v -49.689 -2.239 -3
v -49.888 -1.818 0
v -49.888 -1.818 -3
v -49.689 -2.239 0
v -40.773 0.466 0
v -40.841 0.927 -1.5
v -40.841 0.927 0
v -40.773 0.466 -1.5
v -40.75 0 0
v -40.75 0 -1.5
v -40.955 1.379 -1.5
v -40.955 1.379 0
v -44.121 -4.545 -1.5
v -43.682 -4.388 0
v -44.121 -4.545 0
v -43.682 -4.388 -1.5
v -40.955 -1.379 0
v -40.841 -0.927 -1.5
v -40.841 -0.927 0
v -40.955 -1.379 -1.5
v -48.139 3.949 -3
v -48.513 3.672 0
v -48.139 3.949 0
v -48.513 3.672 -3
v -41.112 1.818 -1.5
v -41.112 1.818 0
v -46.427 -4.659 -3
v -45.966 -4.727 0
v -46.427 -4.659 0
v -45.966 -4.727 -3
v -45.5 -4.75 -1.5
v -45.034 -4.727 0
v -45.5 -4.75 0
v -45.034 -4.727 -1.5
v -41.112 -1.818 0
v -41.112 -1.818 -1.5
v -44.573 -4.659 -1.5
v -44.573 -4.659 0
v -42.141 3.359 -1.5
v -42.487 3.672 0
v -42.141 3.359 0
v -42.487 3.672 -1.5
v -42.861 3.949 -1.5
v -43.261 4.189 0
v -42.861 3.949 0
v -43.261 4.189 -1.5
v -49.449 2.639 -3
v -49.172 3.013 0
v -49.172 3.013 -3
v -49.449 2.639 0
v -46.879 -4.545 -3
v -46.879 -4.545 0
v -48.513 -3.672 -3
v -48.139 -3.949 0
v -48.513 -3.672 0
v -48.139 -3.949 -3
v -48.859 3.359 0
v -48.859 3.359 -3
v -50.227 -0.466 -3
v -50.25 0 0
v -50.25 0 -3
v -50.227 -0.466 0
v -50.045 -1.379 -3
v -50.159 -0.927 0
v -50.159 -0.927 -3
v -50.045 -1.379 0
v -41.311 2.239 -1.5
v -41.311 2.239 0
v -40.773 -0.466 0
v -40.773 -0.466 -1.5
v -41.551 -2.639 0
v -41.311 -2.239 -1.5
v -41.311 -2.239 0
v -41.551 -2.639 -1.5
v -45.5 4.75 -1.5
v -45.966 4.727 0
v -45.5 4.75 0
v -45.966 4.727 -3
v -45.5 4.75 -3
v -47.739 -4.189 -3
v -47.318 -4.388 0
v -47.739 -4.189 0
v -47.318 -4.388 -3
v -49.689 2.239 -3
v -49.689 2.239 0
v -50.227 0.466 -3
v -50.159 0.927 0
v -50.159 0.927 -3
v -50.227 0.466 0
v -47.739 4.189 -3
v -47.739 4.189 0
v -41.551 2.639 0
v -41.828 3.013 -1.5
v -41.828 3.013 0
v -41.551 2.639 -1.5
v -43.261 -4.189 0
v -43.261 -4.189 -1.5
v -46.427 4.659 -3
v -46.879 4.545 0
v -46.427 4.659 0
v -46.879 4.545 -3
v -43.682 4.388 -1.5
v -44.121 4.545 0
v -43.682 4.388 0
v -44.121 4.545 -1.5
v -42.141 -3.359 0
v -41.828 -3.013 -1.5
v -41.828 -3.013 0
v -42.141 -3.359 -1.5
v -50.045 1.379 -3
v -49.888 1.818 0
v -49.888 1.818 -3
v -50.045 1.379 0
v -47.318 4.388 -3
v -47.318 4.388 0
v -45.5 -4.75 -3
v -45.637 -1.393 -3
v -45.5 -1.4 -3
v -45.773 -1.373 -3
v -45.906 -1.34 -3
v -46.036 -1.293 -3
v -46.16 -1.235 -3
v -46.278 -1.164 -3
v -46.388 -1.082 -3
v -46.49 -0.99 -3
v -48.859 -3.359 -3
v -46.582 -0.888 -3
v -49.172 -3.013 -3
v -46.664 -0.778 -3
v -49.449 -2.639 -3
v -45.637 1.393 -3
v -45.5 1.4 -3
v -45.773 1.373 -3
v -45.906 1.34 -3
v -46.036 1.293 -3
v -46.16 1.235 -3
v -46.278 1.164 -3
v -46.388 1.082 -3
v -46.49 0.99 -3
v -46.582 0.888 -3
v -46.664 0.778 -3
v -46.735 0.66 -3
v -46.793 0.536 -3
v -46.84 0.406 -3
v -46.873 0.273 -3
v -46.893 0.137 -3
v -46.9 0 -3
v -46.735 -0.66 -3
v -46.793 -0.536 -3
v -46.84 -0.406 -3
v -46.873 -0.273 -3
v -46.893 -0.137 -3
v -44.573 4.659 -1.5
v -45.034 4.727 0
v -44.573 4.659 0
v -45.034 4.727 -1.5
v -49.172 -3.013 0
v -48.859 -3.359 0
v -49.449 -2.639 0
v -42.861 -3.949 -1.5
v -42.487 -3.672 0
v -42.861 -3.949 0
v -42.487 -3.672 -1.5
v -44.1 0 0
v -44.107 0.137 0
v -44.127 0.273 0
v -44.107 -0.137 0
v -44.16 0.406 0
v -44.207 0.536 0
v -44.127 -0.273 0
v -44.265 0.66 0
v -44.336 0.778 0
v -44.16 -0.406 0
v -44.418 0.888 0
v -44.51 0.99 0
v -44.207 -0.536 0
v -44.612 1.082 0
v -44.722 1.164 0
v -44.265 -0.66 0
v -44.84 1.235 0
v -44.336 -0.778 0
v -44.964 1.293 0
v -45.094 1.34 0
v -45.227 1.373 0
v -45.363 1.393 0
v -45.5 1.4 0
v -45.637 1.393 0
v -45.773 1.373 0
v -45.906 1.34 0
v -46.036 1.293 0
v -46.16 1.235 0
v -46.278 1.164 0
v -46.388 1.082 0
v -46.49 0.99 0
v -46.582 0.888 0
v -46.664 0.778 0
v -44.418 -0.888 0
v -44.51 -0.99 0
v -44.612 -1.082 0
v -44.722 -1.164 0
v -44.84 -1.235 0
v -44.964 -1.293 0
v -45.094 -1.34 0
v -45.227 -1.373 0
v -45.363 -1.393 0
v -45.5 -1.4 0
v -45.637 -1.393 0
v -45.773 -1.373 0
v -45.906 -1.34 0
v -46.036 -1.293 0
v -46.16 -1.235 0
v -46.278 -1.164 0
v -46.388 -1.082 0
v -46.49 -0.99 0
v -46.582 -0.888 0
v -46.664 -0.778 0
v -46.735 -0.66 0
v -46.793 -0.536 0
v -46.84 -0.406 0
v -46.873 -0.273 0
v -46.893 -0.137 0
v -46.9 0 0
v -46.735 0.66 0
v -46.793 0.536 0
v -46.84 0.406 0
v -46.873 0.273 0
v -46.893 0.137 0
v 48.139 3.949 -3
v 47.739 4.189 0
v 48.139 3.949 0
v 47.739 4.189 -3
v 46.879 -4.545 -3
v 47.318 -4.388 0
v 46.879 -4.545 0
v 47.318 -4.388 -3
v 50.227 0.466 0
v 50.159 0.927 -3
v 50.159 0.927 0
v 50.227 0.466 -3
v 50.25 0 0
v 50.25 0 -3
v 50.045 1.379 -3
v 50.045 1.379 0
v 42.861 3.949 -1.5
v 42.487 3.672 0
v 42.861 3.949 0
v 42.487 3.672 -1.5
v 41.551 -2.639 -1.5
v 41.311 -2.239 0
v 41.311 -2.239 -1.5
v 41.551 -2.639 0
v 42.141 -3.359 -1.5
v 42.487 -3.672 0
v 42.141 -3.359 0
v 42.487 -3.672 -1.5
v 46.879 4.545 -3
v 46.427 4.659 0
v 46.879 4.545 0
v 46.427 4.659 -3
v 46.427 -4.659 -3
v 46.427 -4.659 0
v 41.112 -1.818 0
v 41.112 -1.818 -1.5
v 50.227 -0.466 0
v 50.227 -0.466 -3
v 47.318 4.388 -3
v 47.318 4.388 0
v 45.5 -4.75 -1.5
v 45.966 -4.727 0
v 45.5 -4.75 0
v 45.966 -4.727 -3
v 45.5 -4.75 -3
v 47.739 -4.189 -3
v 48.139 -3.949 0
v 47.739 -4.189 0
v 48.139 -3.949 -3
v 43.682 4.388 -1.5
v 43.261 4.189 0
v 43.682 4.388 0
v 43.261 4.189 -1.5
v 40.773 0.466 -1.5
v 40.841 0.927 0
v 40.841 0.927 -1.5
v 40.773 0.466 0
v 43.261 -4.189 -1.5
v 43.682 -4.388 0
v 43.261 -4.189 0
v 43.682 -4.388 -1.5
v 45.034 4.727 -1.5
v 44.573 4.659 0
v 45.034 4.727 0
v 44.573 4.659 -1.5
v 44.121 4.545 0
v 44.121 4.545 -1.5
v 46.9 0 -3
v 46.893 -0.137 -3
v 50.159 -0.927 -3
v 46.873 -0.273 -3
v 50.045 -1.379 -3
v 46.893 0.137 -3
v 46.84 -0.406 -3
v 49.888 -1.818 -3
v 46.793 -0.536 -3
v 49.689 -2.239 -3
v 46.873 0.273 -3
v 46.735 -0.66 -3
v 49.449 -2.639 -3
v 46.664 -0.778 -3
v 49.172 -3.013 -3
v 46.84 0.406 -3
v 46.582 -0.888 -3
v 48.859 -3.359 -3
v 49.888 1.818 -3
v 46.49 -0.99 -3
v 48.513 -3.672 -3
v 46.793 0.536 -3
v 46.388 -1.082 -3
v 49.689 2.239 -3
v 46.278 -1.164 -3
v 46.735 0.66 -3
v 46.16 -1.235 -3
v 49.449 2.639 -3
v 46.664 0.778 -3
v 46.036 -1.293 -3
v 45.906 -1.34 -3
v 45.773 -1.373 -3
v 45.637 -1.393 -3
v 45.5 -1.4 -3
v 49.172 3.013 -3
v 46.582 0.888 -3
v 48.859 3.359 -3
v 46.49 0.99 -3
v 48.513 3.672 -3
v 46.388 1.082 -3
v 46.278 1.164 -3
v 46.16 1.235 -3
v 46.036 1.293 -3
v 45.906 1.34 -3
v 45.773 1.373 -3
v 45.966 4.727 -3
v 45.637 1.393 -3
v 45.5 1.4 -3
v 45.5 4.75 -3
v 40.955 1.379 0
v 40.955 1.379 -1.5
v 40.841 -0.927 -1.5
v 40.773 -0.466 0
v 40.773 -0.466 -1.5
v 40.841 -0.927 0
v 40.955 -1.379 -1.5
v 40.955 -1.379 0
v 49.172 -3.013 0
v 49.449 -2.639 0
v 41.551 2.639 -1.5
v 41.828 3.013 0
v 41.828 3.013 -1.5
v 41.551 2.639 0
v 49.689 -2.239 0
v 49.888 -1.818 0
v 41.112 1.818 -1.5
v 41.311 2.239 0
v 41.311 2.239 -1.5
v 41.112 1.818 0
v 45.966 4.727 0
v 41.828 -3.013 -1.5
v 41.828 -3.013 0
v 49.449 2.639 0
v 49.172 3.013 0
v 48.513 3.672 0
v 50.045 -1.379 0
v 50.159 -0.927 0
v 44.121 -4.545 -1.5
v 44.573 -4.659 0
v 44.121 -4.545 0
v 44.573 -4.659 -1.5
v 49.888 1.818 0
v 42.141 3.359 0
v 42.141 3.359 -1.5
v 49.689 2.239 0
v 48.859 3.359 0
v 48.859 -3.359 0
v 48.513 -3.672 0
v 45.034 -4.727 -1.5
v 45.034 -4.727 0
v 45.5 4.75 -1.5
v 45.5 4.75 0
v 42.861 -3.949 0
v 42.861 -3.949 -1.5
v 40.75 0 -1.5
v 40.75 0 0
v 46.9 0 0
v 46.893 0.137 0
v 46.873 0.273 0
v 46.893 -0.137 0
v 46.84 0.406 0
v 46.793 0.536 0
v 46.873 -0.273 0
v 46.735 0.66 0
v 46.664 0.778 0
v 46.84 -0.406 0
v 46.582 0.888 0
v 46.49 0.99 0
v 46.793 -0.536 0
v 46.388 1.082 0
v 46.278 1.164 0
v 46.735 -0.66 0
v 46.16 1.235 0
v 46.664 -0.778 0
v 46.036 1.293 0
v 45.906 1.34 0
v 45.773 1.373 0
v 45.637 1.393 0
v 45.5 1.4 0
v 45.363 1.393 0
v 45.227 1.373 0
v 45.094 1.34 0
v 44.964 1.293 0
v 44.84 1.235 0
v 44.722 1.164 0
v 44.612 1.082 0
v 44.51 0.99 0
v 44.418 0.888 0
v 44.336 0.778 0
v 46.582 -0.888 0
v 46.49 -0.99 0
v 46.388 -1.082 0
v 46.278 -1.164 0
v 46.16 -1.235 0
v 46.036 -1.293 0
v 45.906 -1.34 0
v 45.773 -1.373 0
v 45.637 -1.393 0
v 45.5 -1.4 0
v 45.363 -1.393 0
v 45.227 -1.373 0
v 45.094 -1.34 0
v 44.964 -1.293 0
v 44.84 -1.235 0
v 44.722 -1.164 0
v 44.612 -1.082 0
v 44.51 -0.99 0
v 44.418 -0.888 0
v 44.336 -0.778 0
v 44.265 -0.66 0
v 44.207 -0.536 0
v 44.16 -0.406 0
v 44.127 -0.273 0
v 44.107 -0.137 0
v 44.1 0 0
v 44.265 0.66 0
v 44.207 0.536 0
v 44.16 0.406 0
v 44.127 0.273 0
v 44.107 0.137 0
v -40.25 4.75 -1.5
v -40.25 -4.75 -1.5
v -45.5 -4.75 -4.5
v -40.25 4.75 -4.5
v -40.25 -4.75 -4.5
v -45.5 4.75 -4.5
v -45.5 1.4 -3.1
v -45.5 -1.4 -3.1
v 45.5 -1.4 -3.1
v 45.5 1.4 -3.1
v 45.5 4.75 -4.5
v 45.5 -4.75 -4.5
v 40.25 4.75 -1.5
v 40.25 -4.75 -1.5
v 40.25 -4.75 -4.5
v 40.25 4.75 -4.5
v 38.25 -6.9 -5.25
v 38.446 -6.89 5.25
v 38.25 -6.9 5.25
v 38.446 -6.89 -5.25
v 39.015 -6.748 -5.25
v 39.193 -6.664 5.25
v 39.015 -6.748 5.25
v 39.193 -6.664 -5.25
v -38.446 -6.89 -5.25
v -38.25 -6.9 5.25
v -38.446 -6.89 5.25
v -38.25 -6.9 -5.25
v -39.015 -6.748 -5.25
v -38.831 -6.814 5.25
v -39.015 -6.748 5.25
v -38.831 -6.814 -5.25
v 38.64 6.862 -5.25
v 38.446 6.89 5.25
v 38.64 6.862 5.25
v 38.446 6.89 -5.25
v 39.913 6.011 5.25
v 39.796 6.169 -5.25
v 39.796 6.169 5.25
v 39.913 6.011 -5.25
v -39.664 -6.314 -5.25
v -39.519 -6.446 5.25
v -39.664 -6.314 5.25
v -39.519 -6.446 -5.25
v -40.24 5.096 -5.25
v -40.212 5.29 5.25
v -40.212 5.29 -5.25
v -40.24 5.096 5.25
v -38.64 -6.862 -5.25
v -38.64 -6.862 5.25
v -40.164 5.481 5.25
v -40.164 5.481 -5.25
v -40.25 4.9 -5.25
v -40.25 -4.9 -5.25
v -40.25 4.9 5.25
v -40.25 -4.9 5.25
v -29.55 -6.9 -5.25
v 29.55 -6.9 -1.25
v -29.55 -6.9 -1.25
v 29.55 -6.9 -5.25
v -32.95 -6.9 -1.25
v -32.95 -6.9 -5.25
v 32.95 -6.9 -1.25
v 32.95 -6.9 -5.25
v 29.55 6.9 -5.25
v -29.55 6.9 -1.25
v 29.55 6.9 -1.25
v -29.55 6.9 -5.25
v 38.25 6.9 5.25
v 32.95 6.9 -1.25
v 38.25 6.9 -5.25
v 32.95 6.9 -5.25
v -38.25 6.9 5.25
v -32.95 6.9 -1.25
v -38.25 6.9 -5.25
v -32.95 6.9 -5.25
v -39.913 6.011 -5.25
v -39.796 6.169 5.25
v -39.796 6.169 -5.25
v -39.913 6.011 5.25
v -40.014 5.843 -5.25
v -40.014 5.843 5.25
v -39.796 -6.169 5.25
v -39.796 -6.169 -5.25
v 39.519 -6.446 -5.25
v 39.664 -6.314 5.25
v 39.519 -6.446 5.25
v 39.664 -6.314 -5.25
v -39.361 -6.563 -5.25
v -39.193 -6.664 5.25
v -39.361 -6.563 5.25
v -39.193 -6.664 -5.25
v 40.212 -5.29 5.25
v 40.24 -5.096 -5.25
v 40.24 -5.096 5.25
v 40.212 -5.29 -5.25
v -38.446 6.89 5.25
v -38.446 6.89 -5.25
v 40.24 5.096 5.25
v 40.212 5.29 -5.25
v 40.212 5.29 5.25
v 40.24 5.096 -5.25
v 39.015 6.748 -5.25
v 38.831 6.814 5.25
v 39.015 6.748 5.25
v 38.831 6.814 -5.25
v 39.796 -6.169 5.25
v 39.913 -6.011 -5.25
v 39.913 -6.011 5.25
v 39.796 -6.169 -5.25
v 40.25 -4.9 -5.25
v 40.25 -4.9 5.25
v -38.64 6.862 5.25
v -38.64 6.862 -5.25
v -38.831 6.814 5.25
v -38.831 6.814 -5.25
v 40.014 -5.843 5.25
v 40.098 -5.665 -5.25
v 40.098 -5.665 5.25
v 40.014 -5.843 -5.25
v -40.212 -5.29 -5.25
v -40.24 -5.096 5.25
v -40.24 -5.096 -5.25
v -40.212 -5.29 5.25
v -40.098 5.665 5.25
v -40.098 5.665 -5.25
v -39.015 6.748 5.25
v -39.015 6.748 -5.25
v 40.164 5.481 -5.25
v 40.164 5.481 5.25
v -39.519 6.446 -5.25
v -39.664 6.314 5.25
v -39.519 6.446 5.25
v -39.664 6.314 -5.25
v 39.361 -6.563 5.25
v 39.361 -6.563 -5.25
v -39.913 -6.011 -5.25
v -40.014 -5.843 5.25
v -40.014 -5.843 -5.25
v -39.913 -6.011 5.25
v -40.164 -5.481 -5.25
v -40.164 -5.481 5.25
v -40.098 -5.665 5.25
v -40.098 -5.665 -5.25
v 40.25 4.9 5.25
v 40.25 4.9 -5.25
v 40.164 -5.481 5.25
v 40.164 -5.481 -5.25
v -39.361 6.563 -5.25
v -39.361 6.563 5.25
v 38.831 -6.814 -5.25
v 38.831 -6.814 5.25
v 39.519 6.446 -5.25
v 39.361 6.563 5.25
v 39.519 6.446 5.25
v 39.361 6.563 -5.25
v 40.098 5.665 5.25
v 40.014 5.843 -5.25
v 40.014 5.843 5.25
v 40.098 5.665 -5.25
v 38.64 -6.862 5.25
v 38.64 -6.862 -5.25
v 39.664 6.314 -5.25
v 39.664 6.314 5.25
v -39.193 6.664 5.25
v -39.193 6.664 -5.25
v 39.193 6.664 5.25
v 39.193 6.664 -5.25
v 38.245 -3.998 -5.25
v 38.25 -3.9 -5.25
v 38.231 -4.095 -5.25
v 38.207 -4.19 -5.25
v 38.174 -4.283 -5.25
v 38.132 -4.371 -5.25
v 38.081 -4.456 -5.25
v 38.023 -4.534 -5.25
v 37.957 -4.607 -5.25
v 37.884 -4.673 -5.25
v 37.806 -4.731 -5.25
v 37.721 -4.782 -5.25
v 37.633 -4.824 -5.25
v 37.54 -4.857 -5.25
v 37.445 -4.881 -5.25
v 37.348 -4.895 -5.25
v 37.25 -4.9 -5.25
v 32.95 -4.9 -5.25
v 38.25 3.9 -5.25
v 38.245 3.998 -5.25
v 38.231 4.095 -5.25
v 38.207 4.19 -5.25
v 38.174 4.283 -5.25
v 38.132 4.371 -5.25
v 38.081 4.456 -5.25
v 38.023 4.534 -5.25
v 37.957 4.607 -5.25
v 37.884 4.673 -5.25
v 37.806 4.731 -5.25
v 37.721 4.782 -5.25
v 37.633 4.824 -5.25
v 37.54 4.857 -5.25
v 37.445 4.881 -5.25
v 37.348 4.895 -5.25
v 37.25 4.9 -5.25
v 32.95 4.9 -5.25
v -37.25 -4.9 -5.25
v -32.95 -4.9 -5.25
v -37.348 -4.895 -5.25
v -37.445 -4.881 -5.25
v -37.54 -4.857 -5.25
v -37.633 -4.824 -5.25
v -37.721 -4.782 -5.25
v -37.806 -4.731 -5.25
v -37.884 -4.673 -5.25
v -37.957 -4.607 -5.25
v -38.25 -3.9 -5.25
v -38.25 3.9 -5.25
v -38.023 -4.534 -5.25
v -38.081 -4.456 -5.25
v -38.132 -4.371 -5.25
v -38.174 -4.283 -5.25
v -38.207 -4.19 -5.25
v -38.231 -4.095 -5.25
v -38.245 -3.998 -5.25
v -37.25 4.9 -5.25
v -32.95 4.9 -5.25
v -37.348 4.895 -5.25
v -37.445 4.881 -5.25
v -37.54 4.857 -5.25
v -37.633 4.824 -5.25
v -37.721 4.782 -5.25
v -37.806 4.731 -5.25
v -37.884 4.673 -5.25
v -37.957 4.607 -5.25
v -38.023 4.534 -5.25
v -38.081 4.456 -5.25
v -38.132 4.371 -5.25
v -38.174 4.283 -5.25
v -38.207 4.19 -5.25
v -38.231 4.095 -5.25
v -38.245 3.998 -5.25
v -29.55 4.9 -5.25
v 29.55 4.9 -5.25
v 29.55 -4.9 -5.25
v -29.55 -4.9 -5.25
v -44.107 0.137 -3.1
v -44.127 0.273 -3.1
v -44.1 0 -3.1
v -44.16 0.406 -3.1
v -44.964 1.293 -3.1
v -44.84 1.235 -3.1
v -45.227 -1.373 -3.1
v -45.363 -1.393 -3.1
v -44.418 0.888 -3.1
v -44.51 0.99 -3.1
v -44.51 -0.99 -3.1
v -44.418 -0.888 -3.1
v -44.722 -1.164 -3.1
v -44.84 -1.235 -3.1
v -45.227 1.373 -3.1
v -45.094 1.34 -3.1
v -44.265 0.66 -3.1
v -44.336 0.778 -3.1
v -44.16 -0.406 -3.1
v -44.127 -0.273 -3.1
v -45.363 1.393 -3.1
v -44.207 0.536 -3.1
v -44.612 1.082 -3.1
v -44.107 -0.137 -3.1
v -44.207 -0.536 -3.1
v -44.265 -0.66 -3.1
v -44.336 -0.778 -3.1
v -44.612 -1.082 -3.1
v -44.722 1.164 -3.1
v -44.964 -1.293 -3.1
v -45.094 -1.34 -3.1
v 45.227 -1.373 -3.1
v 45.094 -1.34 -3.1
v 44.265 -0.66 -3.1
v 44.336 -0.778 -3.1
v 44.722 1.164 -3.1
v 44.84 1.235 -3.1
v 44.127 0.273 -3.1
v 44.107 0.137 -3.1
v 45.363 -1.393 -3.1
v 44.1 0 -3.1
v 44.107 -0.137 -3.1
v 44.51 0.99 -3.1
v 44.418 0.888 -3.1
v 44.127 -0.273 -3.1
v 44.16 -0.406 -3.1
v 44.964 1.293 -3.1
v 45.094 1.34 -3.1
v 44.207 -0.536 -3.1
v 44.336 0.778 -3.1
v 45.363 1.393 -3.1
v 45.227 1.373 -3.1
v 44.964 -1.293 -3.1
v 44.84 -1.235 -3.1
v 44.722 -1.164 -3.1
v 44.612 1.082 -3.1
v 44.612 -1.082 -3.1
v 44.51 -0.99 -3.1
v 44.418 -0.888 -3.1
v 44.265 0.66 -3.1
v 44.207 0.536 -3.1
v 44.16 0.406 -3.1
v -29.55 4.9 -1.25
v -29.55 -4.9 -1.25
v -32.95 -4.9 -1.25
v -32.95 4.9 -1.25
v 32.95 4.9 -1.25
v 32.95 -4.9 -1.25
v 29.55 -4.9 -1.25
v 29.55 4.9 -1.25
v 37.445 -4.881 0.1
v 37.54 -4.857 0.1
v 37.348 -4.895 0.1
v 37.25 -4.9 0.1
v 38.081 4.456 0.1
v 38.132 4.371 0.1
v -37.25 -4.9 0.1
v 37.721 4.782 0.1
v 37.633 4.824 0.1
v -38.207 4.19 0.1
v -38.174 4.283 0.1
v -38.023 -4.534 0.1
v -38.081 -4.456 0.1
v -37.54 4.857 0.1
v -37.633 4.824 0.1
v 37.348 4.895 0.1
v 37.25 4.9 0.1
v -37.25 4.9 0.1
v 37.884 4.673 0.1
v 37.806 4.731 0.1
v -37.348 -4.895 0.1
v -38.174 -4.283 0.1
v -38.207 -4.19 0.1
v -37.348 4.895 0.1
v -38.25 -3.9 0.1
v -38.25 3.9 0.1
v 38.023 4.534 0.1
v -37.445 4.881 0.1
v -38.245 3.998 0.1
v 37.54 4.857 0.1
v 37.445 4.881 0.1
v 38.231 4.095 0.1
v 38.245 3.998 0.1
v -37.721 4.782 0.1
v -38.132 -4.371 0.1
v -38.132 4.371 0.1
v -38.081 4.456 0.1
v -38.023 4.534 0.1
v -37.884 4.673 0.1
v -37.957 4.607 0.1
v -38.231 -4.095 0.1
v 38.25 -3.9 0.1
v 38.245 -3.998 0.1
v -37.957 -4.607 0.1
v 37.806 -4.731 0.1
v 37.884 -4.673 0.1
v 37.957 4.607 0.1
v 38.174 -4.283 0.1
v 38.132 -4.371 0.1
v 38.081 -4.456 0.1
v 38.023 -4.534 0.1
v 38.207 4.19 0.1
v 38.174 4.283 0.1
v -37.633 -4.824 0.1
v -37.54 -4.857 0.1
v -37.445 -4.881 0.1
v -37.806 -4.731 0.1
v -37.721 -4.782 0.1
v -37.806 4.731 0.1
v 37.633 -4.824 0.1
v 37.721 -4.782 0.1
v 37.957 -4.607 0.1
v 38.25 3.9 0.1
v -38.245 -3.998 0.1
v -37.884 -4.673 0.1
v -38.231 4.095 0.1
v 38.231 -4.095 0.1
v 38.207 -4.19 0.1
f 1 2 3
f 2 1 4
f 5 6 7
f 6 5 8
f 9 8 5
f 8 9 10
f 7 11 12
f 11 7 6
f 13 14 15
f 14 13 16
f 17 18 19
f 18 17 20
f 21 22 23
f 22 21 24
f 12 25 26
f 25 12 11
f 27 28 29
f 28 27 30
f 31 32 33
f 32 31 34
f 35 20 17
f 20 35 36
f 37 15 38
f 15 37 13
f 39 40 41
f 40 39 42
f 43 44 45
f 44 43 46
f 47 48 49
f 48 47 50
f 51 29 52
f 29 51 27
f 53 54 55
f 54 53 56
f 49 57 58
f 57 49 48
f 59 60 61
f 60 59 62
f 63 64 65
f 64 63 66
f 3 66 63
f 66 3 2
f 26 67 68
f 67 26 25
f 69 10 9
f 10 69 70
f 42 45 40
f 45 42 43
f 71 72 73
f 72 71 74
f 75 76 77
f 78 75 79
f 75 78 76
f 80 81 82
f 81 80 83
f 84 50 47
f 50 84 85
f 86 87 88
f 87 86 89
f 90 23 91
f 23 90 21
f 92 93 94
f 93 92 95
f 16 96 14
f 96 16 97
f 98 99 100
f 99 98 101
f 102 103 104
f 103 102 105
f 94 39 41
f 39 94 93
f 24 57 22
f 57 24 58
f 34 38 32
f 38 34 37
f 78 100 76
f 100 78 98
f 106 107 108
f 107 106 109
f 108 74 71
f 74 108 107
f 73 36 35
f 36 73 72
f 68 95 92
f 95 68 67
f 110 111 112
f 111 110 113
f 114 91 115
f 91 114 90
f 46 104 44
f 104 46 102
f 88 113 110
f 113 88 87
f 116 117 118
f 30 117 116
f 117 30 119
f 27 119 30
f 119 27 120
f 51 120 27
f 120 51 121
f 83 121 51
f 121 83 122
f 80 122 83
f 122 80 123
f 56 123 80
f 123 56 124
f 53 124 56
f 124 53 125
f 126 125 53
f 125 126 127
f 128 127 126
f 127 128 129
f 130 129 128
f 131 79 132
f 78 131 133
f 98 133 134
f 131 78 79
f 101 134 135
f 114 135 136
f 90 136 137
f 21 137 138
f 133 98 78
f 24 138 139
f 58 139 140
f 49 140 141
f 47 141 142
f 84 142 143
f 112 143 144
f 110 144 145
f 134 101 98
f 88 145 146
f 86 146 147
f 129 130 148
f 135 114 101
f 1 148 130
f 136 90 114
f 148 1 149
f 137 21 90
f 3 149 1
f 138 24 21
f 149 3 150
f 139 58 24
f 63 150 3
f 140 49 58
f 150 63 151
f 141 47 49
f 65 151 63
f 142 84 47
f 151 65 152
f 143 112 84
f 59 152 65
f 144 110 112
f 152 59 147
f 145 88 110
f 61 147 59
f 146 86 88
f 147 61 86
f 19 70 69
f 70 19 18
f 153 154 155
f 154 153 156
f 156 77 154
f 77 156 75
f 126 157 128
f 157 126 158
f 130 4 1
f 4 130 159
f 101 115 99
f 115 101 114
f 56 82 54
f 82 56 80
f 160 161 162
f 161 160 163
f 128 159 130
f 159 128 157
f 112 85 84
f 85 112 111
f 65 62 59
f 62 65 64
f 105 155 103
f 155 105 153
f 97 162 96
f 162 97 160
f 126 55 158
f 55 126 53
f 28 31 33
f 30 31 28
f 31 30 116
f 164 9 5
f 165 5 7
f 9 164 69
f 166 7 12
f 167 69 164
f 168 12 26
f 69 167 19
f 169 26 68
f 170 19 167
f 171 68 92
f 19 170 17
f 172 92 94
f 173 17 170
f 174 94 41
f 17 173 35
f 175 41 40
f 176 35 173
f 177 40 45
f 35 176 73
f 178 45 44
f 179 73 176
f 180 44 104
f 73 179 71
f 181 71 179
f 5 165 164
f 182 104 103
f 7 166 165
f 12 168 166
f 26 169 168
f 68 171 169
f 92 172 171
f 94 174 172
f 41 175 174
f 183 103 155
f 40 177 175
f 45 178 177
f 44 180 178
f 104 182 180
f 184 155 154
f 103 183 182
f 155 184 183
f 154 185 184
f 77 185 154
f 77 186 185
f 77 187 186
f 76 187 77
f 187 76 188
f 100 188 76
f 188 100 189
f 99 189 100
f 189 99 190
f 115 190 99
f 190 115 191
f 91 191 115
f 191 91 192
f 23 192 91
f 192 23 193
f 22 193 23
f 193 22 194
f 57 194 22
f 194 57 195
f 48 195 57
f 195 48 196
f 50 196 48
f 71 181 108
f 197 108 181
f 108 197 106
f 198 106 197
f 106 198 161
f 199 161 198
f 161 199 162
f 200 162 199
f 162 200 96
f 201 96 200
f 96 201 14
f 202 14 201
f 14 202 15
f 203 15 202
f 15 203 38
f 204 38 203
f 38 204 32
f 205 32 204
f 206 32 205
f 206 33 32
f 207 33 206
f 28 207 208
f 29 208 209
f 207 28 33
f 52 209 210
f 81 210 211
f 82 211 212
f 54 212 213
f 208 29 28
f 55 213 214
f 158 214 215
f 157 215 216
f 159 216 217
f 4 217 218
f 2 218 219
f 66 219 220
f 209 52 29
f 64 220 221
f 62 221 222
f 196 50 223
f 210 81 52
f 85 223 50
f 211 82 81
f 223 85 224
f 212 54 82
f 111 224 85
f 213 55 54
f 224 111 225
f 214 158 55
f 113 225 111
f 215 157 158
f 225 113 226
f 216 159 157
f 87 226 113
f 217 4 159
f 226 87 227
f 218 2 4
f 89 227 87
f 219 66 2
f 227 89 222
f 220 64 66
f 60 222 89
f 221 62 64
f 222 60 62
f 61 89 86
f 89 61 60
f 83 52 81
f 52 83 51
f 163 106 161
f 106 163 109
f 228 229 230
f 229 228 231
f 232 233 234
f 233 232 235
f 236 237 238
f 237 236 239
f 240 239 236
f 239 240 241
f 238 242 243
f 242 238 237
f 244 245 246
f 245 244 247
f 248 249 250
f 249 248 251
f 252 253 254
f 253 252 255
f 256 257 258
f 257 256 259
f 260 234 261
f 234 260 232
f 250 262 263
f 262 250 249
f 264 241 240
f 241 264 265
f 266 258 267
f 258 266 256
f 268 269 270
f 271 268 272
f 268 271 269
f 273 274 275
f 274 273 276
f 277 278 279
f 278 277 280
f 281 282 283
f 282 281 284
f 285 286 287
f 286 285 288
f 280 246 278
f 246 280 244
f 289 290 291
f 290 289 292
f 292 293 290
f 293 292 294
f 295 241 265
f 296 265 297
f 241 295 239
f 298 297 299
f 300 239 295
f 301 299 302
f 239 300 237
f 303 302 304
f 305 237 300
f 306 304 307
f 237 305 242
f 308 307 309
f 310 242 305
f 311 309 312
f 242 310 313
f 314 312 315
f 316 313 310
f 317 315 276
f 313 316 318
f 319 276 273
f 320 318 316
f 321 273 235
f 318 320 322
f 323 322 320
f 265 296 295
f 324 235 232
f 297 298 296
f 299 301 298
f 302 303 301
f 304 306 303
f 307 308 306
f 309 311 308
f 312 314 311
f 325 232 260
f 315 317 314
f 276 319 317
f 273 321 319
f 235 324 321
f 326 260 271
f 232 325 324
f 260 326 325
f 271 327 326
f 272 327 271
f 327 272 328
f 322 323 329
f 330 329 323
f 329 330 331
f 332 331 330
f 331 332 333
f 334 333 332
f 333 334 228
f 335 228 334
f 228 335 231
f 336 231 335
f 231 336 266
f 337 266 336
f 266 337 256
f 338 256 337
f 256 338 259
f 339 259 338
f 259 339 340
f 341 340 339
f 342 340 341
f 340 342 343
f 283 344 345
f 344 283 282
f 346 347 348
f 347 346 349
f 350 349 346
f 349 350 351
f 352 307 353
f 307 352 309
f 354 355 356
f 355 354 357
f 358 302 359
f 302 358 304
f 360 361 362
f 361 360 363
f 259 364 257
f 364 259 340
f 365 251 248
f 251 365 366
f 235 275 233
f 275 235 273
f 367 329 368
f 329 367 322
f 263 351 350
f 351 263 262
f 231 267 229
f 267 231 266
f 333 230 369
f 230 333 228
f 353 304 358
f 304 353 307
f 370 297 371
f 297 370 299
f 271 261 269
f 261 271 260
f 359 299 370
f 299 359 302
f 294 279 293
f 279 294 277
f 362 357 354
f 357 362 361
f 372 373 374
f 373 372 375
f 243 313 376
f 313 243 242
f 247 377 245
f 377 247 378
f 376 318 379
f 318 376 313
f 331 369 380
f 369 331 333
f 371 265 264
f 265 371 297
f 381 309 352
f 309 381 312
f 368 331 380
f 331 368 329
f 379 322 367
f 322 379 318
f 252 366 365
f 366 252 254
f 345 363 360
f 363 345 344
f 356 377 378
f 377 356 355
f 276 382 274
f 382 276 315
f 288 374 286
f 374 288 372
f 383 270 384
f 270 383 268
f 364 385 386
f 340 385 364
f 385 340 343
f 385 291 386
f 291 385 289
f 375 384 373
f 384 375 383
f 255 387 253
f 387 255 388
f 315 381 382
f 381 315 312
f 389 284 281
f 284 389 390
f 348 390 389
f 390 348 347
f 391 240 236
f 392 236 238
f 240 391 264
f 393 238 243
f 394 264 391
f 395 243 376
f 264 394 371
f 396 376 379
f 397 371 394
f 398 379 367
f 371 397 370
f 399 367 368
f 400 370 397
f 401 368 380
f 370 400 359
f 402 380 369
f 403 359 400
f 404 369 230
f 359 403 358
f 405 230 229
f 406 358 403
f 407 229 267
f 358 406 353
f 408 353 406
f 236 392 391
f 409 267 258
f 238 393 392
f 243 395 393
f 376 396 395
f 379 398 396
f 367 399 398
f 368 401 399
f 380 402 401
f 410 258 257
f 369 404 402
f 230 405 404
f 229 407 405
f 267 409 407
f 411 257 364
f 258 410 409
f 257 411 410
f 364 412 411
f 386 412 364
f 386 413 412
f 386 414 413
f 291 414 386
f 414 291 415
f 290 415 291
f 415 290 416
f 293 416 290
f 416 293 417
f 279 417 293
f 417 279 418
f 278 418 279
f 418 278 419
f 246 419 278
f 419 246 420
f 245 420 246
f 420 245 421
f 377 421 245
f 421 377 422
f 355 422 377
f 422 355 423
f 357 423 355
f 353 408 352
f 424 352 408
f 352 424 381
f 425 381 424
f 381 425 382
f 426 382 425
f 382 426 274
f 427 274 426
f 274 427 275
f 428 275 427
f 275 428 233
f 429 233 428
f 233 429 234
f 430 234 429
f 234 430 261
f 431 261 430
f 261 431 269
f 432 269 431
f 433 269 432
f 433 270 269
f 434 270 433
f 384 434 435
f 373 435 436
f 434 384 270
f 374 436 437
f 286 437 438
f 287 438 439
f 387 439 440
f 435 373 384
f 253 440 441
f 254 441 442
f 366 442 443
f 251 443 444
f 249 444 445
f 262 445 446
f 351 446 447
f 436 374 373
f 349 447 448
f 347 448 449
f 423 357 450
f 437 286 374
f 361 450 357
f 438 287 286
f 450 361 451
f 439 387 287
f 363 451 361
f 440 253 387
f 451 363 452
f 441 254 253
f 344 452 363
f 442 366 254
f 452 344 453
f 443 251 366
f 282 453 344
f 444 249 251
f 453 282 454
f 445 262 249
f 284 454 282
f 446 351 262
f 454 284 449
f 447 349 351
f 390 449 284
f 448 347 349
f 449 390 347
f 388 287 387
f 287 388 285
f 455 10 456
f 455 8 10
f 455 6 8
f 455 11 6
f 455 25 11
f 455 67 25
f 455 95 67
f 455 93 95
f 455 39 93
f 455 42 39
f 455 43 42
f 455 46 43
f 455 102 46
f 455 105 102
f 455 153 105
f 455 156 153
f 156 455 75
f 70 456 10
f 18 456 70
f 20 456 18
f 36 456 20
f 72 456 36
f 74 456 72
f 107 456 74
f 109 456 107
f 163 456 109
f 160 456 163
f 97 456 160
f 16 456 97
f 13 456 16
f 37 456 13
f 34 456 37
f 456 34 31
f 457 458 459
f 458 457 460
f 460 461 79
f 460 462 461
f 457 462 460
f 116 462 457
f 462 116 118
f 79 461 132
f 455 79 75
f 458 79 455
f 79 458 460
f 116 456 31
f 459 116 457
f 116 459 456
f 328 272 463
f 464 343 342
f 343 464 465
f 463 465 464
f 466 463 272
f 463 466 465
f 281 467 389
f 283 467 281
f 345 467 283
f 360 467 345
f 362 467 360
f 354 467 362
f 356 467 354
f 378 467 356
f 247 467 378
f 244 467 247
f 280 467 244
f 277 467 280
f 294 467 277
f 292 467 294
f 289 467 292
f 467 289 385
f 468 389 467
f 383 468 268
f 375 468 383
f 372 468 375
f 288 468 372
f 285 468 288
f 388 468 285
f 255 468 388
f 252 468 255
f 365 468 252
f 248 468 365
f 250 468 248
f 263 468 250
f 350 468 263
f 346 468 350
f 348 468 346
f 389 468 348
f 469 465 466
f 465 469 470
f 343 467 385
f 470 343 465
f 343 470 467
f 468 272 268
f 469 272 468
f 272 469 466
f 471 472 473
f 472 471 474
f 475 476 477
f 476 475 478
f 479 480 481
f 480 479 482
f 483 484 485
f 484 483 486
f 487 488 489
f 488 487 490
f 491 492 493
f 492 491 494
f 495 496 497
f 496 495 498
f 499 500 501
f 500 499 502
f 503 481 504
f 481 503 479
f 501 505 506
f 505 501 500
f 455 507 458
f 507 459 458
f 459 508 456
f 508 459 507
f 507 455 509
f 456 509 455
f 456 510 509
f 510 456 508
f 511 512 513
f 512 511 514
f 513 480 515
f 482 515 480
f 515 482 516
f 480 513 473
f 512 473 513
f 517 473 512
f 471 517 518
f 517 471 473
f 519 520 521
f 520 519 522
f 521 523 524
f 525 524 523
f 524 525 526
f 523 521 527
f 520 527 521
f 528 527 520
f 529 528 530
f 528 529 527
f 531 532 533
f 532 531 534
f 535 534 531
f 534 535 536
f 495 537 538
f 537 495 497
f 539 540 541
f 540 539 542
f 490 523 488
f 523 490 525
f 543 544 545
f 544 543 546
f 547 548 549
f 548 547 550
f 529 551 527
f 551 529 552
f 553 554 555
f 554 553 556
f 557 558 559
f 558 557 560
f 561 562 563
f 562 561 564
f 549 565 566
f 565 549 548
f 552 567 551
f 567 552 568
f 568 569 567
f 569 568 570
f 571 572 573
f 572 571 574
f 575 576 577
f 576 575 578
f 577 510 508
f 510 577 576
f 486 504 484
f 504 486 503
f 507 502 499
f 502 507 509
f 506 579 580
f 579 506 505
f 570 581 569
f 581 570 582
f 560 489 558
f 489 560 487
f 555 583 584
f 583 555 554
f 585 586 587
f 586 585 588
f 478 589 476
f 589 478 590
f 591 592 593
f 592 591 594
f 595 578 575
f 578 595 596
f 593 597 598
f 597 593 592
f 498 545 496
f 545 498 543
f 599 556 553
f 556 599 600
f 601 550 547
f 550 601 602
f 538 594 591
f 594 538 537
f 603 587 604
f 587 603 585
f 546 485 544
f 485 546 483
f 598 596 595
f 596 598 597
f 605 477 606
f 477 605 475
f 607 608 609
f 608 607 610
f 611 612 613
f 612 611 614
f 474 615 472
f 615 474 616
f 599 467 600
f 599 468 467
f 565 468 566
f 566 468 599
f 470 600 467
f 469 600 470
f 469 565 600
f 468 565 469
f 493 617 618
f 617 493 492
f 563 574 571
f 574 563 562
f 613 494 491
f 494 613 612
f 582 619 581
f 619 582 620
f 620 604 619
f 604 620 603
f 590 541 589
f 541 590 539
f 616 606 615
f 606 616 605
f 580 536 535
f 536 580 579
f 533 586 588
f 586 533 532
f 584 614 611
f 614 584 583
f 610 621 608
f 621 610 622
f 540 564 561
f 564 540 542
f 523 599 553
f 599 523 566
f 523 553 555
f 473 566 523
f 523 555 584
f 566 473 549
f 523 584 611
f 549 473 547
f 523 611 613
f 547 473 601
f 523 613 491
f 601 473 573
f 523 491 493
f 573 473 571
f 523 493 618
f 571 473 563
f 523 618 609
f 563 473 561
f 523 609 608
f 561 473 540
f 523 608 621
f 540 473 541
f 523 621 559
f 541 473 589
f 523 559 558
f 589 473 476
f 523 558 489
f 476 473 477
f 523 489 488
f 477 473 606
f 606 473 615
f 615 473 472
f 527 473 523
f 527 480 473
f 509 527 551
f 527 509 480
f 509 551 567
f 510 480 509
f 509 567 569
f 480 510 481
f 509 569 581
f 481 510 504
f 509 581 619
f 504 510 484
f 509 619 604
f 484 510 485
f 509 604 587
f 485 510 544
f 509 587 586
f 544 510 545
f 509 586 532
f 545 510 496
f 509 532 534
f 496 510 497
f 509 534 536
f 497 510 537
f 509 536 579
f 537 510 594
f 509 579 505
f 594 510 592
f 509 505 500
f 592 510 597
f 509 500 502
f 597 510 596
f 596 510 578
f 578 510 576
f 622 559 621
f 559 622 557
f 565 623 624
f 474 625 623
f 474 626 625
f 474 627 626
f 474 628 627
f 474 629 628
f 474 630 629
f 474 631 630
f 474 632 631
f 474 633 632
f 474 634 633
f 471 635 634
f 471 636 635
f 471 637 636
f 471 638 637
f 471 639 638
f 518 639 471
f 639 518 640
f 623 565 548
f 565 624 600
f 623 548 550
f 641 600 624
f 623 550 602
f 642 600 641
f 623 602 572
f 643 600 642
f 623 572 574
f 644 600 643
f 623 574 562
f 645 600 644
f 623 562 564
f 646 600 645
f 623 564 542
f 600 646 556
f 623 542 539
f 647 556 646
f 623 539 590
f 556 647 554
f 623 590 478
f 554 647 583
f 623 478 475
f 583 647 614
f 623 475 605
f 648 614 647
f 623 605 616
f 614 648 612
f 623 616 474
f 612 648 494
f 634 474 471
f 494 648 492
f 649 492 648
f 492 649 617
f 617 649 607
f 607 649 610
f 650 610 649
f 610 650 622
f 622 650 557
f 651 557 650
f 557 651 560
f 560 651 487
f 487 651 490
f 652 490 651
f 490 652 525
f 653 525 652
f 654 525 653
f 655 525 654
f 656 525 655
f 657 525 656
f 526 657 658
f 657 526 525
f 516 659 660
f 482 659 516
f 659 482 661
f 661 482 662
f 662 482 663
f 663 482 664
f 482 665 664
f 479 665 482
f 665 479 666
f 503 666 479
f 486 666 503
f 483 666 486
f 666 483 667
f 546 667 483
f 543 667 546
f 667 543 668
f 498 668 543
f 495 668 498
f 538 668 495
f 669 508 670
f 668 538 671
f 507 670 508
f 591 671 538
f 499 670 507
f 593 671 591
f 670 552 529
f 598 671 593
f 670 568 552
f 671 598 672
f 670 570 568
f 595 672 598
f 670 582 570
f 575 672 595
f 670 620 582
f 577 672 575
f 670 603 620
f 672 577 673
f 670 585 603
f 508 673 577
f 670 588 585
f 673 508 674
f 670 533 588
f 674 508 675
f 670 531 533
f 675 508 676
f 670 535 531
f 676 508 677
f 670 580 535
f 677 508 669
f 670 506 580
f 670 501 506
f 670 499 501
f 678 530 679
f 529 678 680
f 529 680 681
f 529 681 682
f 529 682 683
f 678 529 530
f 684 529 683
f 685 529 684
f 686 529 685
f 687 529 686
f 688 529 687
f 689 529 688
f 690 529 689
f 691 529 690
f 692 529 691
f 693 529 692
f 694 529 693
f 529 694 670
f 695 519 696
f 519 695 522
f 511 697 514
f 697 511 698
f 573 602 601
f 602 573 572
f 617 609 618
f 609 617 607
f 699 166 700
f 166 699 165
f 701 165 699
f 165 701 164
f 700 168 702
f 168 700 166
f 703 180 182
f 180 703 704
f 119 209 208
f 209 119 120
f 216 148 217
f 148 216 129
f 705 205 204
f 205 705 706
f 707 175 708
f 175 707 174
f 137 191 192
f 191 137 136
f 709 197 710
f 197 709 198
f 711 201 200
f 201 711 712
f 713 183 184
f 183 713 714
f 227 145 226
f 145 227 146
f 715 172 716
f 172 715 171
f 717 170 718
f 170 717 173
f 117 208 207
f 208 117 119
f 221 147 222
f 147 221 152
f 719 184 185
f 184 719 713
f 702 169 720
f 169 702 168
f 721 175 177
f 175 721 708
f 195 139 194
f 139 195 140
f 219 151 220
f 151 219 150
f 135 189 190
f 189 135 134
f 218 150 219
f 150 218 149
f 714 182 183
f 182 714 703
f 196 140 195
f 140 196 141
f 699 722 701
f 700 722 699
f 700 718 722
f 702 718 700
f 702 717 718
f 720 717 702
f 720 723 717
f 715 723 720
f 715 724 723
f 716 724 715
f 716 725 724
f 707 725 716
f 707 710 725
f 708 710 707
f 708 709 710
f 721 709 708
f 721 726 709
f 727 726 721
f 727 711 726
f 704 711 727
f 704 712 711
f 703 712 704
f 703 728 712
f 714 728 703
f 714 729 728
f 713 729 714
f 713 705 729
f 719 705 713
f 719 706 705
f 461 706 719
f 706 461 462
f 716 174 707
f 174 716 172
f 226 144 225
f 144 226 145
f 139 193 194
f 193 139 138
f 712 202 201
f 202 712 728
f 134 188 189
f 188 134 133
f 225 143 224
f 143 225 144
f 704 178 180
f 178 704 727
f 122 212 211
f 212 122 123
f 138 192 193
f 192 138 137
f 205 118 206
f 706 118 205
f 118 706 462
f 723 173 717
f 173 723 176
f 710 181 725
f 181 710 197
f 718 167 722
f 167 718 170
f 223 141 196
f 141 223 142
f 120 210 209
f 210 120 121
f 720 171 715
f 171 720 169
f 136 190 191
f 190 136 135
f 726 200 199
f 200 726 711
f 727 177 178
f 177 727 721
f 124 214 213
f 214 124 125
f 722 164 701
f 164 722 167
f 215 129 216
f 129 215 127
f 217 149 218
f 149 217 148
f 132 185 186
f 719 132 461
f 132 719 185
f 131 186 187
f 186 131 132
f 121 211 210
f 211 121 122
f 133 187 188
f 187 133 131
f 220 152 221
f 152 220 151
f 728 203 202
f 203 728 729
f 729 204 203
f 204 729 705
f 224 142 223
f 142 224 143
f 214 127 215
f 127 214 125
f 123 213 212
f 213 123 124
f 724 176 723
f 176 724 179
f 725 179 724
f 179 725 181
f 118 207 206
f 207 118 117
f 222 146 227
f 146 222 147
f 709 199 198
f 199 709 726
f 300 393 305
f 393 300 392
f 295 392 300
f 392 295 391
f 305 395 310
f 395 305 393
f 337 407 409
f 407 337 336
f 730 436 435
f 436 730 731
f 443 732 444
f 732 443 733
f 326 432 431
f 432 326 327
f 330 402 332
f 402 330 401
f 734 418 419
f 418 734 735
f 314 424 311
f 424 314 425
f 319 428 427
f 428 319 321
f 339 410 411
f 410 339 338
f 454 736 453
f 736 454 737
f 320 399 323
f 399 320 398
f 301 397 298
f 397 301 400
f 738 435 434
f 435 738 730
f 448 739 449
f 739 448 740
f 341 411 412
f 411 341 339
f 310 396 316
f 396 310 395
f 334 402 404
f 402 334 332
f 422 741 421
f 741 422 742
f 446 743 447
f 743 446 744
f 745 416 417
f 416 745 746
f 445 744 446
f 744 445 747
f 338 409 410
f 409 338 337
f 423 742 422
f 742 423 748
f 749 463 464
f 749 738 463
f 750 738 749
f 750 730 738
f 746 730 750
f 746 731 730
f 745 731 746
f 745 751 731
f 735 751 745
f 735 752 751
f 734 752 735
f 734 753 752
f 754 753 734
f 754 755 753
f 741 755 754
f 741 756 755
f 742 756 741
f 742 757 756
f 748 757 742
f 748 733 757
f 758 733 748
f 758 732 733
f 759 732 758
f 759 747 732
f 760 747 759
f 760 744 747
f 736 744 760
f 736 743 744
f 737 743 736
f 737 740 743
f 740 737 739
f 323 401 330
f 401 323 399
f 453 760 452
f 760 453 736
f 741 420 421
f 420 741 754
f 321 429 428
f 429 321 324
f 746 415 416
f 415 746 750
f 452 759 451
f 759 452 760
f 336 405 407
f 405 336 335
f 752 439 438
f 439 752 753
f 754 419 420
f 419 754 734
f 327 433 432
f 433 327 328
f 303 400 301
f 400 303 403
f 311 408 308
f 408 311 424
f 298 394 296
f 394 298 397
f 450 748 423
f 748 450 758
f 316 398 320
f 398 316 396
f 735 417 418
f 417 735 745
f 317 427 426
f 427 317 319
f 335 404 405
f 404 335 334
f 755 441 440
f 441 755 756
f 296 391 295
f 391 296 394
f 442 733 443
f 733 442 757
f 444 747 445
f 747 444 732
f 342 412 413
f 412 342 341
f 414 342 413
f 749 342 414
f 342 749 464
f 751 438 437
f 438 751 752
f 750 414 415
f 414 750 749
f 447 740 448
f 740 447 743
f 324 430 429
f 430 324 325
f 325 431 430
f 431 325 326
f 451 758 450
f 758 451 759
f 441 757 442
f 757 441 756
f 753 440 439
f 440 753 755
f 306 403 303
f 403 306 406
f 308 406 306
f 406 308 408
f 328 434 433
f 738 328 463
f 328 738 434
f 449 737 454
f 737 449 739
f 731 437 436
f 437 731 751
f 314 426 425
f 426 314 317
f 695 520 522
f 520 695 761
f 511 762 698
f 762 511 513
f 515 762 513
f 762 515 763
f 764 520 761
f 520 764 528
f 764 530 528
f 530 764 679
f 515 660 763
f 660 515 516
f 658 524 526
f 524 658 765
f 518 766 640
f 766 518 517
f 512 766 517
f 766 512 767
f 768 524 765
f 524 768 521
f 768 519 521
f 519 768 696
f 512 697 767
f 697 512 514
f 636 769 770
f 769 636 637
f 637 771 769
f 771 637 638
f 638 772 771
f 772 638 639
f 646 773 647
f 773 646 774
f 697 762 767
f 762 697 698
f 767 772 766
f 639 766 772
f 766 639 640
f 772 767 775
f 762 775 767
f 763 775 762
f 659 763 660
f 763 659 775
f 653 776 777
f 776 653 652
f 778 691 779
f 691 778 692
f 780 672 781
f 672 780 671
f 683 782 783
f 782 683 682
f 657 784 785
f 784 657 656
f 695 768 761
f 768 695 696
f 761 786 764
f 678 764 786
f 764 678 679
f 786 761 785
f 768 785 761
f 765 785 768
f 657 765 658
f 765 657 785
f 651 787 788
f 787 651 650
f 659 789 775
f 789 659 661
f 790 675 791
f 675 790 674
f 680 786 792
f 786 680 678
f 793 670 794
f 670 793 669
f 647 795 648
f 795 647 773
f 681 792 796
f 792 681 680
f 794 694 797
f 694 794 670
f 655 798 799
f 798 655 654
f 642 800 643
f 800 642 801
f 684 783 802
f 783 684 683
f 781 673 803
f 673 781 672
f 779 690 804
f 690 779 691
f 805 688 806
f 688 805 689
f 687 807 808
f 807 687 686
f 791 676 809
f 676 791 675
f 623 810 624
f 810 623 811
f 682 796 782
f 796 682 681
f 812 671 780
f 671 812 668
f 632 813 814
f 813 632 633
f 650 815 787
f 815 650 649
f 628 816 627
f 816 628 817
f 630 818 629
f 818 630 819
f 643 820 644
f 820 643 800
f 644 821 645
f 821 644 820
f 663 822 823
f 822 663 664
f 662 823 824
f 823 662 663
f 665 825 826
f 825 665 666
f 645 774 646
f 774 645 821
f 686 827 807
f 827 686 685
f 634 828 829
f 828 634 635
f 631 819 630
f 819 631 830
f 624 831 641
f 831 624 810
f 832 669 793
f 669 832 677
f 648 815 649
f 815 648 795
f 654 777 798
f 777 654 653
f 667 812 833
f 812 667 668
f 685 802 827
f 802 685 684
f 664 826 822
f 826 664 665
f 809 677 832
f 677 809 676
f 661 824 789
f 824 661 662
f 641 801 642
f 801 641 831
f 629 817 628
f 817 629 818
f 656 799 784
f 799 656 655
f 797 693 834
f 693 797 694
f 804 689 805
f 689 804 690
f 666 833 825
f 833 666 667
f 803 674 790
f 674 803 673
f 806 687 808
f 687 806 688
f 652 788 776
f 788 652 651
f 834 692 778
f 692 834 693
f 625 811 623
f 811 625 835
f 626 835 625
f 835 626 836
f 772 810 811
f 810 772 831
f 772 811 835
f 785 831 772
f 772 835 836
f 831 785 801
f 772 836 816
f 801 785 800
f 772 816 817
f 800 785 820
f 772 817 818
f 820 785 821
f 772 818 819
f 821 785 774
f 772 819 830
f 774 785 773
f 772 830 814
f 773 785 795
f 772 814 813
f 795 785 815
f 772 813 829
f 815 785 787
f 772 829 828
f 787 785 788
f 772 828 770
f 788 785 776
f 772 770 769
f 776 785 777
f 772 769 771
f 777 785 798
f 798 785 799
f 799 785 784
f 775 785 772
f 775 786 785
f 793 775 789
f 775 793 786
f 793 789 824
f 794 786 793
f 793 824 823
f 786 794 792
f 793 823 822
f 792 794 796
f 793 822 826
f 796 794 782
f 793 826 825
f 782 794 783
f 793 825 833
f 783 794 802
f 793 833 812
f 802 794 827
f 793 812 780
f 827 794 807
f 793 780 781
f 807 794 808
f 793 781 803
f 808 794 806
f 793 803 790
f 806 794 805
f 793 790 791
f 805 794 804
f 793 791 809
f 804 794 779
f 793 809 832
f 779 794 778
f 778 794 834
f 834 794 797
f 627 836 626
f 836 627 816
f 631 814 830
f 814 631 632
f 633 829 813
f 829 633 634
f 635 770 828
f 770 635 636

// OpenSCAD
// file: ../../sorgenti/parametri.scad
// ============================================================
// parametri.scad — tutte le misure del progetto, in millimetri
// ------------------------------------------------------------
// Unica fonte di verità per la geometria: se cambia un
// componente, si cambia QUI e si rigenerano gli STL con
//   ./modelli-3d/genera-stl.sh
//
// Le misure marcate [VERIFICARE] vanno ricontrollate col
// calibro quando arrivano i pezzi, prima di stampare il case.
// ============================================================

// Risoluzione delle curve: 48 per lavorare, 96 per gli STL finali.
RISOLUZIONE = 64;

// ---------- Tolleranze di stampa (Kobra S2 / S3 Max, ugello 0,4) ----------
GIOCO        = 0.35;  // gioco fra due pezzi stampati che si accoppiano
GIOCO_FORO   = 0.25;  // sovramisura dei fori per i componenti
PARETE_MIN   = 1.6;   // spessore minimo di una parete portante (4 linee)

// ---------- Scocca ----------
// Scocca = pareti + coperchio in UN SOLO pezzo (si stampa capovolta).
// Il fondo è una piastra separata, avvitata dall'esterno.
BOX_X        = 130;   // larghezza
BOX_Y        = 130;   // profondità
BOX_Z        = 100;   // altezza totale, fondo compreso
PARETE       = 2.4;   // spessore pareti (3 perimetri a 0,8)
TOP_SP       = 5.0;   // spessore del coperchio (serve per il dado del tasto arcade)
RAGGIO_VERT  = 8;     // raggio degli angoli verticali (spec: >= 5)
RAGGIO_TOP   = 3;     // raccordo del bordo superiore
FONDO_SP     = 3.0;   // spessore della piastra di fondo
FONDO_INCASSO = FONDO_SP;  // il fondo è incassato e a filo con le pareti

// ---------- Zona NFC sul coperchio ----------
NFC_D        = 62;    // diametro dello scasso di appoggio
NFC_PROF     = 3.0;   // profondità dello scasso
NFC_X        = 0;     // posizione del centro (X=0 = centro scatola)
NFC_Y        = 28;    // spostato verso il retro, davanti ci stanno i comandi
NFC_TACCA_D  = 14;    // tacche laterali per sollevare il vinile con un dito
// Fondo dello scasso = TOP_SP - NFC_PROF = 2,0 mm (limite di specifica)

// ---------- Cursore volume (potenziometro a slitta B10K) ----------
CURSORE_CORSA   = 60;    // corsa utile [VERIFICARE sul pezzo]
CURSORE_LUNG    = 75;    // lunghezza totale del corpo [VERIFICARE]
CURSORE_LARG    = 9;     // larghezza del corpo [VERIFICARE]
CURSORE_ALT     = 9;     // altezza del corpo sopra il PCB [VERIFICARE]
CURSORE_LEVA_X  = 2.0;   // spessore della levetta
CURSORE_LEVA_Y  = 6.0;   // larghezza della levetta
CURSORE_FESSURA_W = 3.2; // larghezza della fessura nel coperchio
CURSORE_Y       = -16;   // posizione sul coperchio
CURSORE_Z_SOTTO = 7;     // quota del corpo del potenziometro sotto la faccia interna

// ---------- Tasti arcade ----------
// "30 mm" è il diametro del cappuccio: il foro di montaggio è 28 mm
// sui modelli con ghiera filettata. [VERIFICARE col pezzo in mano]
TASTO_FORO   = 28.0;
TASTO_CAPPUCCIO = 33;
TASTO_X      = 35;    // centri a +/- 35 -> 70 mm fra i centri
TASTO_Y      = -42;

// ---------- Display e-paper 2,13" (Waveshare 250x122) ----------
EPD_PCB_X    = 59.2;  // [VERIFICARE]
EPD_PCB_Z    = 29.2;  // [VERIFICARE]
EPD_PCB_SP   = 1.2;   // spessore del modulo senza componenti
EPD_FIN_X    = 50;    // finestra visibile (area attiva 48,55 x 23,7)
EPD_FIN_Z    = 25.5;
EPD_Z        = 76;    // quota del centro finestra sulla parete frontale
EPD_PARETE   = 1.2;   // parete sottile davanti al display (0 = finestra aperta)

// ---------- Altoparlante ----------
ALT_D        = 40;    // diametro esterno [VERIFICARE]
ALT_ALT      = 6;     // altezza col magnete [VERIFICARE]
ALT_Z        = 32;    // quota del centro sulla parete frontale
ALT_GRIGLIA_D   = 1.8; // fori della griglia (spec: <= 2 mm)
ALT_CAMERA_PROF = 12;  // profondità della camera chiusa dietro il cono
ALT_TUBO_OD     = 52;  // diametro esterno del tubo portaltoparlante
ALT_TUBO_LUNG   = 12;  // lunghezza del tubo verso l'interno
ALT_CAMERA_SEDE = 46.4;// controforo in cui si innesta la camera

// ---------- Lettore PN5180 ----------
// Fissato sotto il coperchio con biadesivo + nervature di contenimento.
// Le nervature sono aperte su un lato: il modulo entra a scorrere.
PN_X         = 58;    // ingombro del modulo, lato X [VERIFICARE]
PN_Y         = 47;    // ingombro del modulo, lato Y [VERIFICARE]
PN_ALT       = 8;     // altezza totale coi componenti [VERIFICARE]

// ---------- Retro: USB-C e microSD ----------
USB_X        = -28;   // posizione del centro sulla parete di fondo
USB_Z        = 18;
USB_W        = 11.0;  // foro per il connettore USB-C del TP4056
USB_H        = 6.0;
SD_X         = 28;
SD_Z         = 18;
SD_W         = 14.0;  // fessura di inserimento della microSD
SD_H         = 3.4;

// ---------- Fondo: interruttore, tasto genitori, vano batteria ----------
SW_X         = -40;   // interruttore a slitta da pannello
SW_Y         = -53;
SW_FORO_X    = 13.0;  // [VERIFICARE: SS12D00 o simile]
SW_FORO_Y    = 8.0;
SW_VITI      = 19.5;  // distanza fra le due viti di fissaggio
SW_INCASSO   = 1.6;   // incasso per non sporgere dal fondo

GEN_X        = 40;    // tasto genitori (tattile 6 mm), incassato
GEN_Y        = -53;
GEN_FORO_D   = 6.0;   // passa un polpastrello adulto, non la mano di un bimbo
GEN_POZZO_D  = 11;    // pozzetto di incasso
GEN_POZZO_H  = 1.8;

// Portabatteria con l'asse lungo su Y, sul lato destro: la basetta
// millefori gli passa sopra senza toccarlo.
BATT_HOLDER_X = 24;   // larghezza [VERIFICARE]
BATT_HOLDER_Y = 78;   // lunghezza [VERIFICARE]
BATT_HOLDER_Z = 20;
BATT_X        = 24;   // centro del vano batteria
BATT_Y        = 0;
SPORT_X       = 26;   // apertura dello sportellino batteria
SPORT_Y       = 72;
SPORT_PIASTRA_X = 40; // piastrina dello sportellino
SPORT_PIASTRA_Y = 82;
SPORT_SP      = 2.5;  // spessore dello sportellino
SPORT_RABBET  = 1.2;  // incasso dello sportellino (resta a filo)
SPORT_VITI_DX = 14;   // viti dello sportellino, scostamento da BATT_X
SPORT_VITI_DY = 36;
AUTOFIL_D     = 2.1;  // preforo per vite autofilettante M2,5 nel PETG

// ---------- Viti e inserti ----------
VITE_D       = 2.5;        // M2,5
VITE_FORO    = 2.8;        // passaggio della vite
VITE_TESTA_D = 5.0;        // svasatura della testa
INSERTO_D    = 3.6;        // inserto a caldo M2,5 [VERIFICARE col lotto]
INSERTO_H    = 5.0;
BOSS_D       = 7.5;        // diametro del pilastrino che ospita l'inserto
BOSS_OFF     = 6;          // distanza del pilastrino dalla parete interna

// ---------- Elettronica interna ----------
MILLEFORI_X  = 90;    // basetta millefori (90 x 70)
MILLEFORI_Y  = 70;
MILLEFORI_Z  = 28;    // quota della basetta sopra il fondo
MILLEFORI_SP = 1.6;
MILLEFORI_VITI_X = 41; // colonnine di sostegno
MILLEFORI_VITI_Y = 31;

// ---------- Statuine ----------
ST_BASE_D    = 40;    // cilindro di base
ST_BASE_H    = 8;
ST_TAG_D     = 25;    // tag NTAG213 adesivo
ST_TAG_SEDE_D = 26.4; // sede del tag, con gioco
ST_TAG_SEDE_H = 1.0;  // profondità della sede
ST_TAG_FONDO = 1.0;   // spessore sotto il tag (spec: 1 mm dal fondo)
ST_SMUSSO    = 1.5;   // smusso del bordo della base

// ---------- Vinili ----------
VIN_D        = 60;
VIN_H        = 4;
VIN_SOLCO_H  = 0.4;   // rilievo dei solchi
VIN_ETICH_D  = 24;    // etichetta centrale
VIN_RAGGIO   = 1.2;   // raccordo del bordo

// ---------- Calibro parti piccole (EN 71-1) ----------
CAL_D        = 31.7;
CAL_H_MIN    = 25.4;
CAL_H_MAX    = 57.1;
// file: ../../sorgenti/libreria.scad
// ============================================================
// libreria.scad — forme di base riusate da tutti i pezzi
// ============================================================
include <parametri.scad>

$fn = RISOLUZIONE;

// Prisma a sezione rettangolare con angoli arrotondati.
module piastra(x, y, h, r) {
    linear_extrude(height = h)
        offset(r = r) square([x - 2*r, y - 2*r], center = true);
}

// Scatola piena con angoli verticali arrotondati (rv) e bordo
// superiore raccordato (rt). Il raccordo è approssimato a gradini
// uniti con hull(): resta liscio e si stampa senza supporti.
module scatola_arrotondata(x, y, z, rv, rt, passi = 12) {
    union() {
        piastra(x, y, z - rt, rv);
        for (i = [0 : passi - 1]) {
            a0 = 90 * i / passi;
            a1 = 90 * (i + 1) / passi;
            k0 = rt * (1 - cos(a0));  k1 = rt * (1 - cos(a1));
            h0 = rt * sin(a0);        h1 = rt * sin(a1);
            hull() {
                translate([0, 0, z - rt + h0])
                    piastra(x - 2*k0, y - 2*k0, 0.02, max(rv - k0, 0.6));
                translate([0, 0, z - rt + h1])
                    piastra(x - 2*k1, y - 2*k1, 0.02, max(rv - k1, 0.6));
            }
        }
    }
}

// Foro di passaggio per vite con svasatura della testa (testa in basso,
// si avvita dal basso verso l'alto).
module foro_svasato(h = 10, d = VITE_FORO, testa_d = VITE_TESTA_D, testa_h = 1.6) {
    translate([0, 0, -0.1]) cylinder(h = h + 0.2, d = d);
    translate([0, 0, -0.1]) cylinder(h = testa_h + 0.1, d1 = testa_d, d2 = d);
}

// Pilastrino con sede per inserto a caldo M2,5 (si inserisce dal basso).
module boss_inserto(h = 12, d = BOSS_D) {
    difference() {
        cylinder(h = h, d = d);
        translate([0, 0, -0.1]) cylinder(h = INSERTO_H + 0.1, d = INSERTO_D);
        // scarico sopra l'inserto, per la punta della vite
        translate([0, 0, INSERTO_H]) cylinder(h = h, d = VITE_D + 0.4);
    }
}

// Griglia di fori a nido d'ape dentro un cerchio di diametro d_area.
module griglia_tonda(d_area, spessore, d_foro = ALT_GRIGLIA_D, passo = 3.2) {
    n = ceil(d_area / passo) + 2;
    for (i = [-n : n], j = [-n : n]) {
        x = i * passo + (abs(j) % 2) * passo / 2;
        y = j * passo * 0.866;
        if (sqrt(x*x + y*y) <= (d_area - d_foro) / 2)
            translate([x, y, -0.1]) cylinder(h = spessore + 0.2, d = d_foro);
    }
}

// Fessura allungata (slot) con estremi arrotondati, asse X.
module fessura(lung, larg, h) {
    hull() {
        translate([-(lung - larg)/2, 0, 0]) cylinder(h = h, d = larg);
        translate([ (lung - larg)/2, 0, 0]) cylinder(h = h, d = larg);
    }
}

// Scritta in rilievo (per i provini e le etichette).
module scritta(t, dim = 6, alt = 0.6) {
    linear_extrude(height = alt)
        text(t, size = dim, halign = "center", valign = "center",
             font = "Helvetica:style=Bold");
}

// Freccia piena, punta verso +X, usata per le icone dei tasti.
module freccia(lung = 16, larg = 14, alt = 0.8) {
    gambo = larg / 5;          // mezza larghezza del gambo
    testa = lung * 0.45;       // lunghezza della punta
    linear_extrude(height = alt)
        polygon([[-lung/2, -gambo], [lung/2 - testa, -gambo],
                 [lung/2 - testa, -larg/2], [lung/2, 0],
                 [lung/2 - testa, larg/2], [lung/2 - testa, gambo],
                 [-lung/2, gambo]]);
}

// Icona "volume": tre barrette crescenti, asse X.
module icona_volume(n = 3, alt = 0.8, passo = 3.2, base = 2.0, cresc = 1.6) {
    for (i = [0 : n - 1])
        translate([i * passo, 0, 0])
            linear_extrude(height = alt)
                square([1.8, base + i * cresc], center = true);
}

// Cava a sezione rettangolare arrotondata, asse di estrusione Y.
// Utile per finestre e fessure nelle pareti verticali.
module cava_y(x, z, prof, r = 1.5) {
    rotate([90, 0, 0])
        linear_extrude(height = prof, center = true)
            offset(r = r) square([x - 2*r, z - 2*r], center = true);
}

// Pilastrino che parte dal piano del fondo e ospita un inserto a caldo
// (inserito dal basso). La punta conica in alto lo rende stampabile
// anche a scatola capovolta.
module boss_fondo(h = 12) {
    union() {
        difference() {
            cylinder(h = h, d = BOSS_D);
            translate([0, 0, -0.1]) cylinder(h = INSERTO_H + 0.1, d = INSERTO_D);
            translate([0, 0, INSERTO_H]) cylinder(h = h, d = VITE_D + 0.6);
        }
        translate([0, 0, h]) cylinder(h = BOSS_D/2, d1 = BOSS_D, d2 = 0.4);
    }
}

// Pilastrino appeso al soffitto (coperchio): l'inserto entra dal basso.
module boss_soffitto(h = 7) {
    difference() {
        translate([0, 0, -h]) cylinder(h = h, d = BOSS_D);
        translate([0, 0, -h - 0.1]) cylinder(h = INSERTO_H + 0.1, d = INSERTO_D);
    }
}
// main file
// ============================================================
// culla-cursore.scad — supporto del potenziometro a slitta
// ------------------------------------------------------------
// Il potenziometro appoggia nella culla, la culla si avvita in
// alto nei due pilastrini sotto al coperchio: la levetta resta
// così allineata alla fessura senza dipendere dai fori di
// fissaggio del potenziometro (che cambiano da marca a marca).
// Due fascette passanti nelle asole lo bloccano.
//
// STAMPA: appoggiata sul piano (lato aperto verso l'alto).
// ============================================================
include <../../sorgenti/libreria.scad>

culla();

CULLA_VITI_X = CURSORE_LUNG/2 + 8;      // deve coincidere con scocca.scad
PARETE_C = 2;
INT_X = CURSORE_LUNG + 1.5;
INT_Y = CURSORE_LARG + 0.8;
PROF  = CURSORE_ALT + 1.5;
TAB   = 3;                              // spessore delle alette avvitate

module culla() {
    difference() {
        union() {
            // cassetta
            translate([0, 0, -PROF/2])
                piastra(INT_X + 2*PARETE_C, INT_Y + 2*PARETE_C, PROF, 2);
            // alette di fissaggio, a filo del bordo superiore
            for (sx = [-1, 1])
                translate([sx * CULLA_VITI_X, 0, -TAB])
                    cylinder(h = TAB, d = BOSS_D + 2);
            for (sx = [-1, 1])
                translate([sx * (INT_X/2 + CULLA_VITI_X)/2, 0, -TAB])
                    cube([CULLA_VITI_X - INT_X/2, BOSS_D + 2, TAB], center = true);
        }
        // vano del potenziometro
        translate([0, 0, -PROF - 0.1])
            piastra(INT_X, INT_Y, PROF + 0.2, 1);
        // finestra sul fondo per i piedini di saldatura
        translate([0, 0, -PROF - 0.2])
            piastra(INT_X - 12, INT_Y - 3, PARETE_C + 0.4, 1);
        // fori delle viti
        for (sx = [-1, 1])
            translate([sx * CULLA_VITI_X, 0, -TAB - 0.1])
                cylinder(h = TAB + 0.2, d = VITE_FORO);
        // asole per le fascette
        for (sx = [-1, 1])
            translate([sx * (INT_X/2 - 7), 0, -PROF/2])
                cube([3.4, INT_Y + 2*PARETE_C + 2, PROF - 2.5], center = true);
    }
}
